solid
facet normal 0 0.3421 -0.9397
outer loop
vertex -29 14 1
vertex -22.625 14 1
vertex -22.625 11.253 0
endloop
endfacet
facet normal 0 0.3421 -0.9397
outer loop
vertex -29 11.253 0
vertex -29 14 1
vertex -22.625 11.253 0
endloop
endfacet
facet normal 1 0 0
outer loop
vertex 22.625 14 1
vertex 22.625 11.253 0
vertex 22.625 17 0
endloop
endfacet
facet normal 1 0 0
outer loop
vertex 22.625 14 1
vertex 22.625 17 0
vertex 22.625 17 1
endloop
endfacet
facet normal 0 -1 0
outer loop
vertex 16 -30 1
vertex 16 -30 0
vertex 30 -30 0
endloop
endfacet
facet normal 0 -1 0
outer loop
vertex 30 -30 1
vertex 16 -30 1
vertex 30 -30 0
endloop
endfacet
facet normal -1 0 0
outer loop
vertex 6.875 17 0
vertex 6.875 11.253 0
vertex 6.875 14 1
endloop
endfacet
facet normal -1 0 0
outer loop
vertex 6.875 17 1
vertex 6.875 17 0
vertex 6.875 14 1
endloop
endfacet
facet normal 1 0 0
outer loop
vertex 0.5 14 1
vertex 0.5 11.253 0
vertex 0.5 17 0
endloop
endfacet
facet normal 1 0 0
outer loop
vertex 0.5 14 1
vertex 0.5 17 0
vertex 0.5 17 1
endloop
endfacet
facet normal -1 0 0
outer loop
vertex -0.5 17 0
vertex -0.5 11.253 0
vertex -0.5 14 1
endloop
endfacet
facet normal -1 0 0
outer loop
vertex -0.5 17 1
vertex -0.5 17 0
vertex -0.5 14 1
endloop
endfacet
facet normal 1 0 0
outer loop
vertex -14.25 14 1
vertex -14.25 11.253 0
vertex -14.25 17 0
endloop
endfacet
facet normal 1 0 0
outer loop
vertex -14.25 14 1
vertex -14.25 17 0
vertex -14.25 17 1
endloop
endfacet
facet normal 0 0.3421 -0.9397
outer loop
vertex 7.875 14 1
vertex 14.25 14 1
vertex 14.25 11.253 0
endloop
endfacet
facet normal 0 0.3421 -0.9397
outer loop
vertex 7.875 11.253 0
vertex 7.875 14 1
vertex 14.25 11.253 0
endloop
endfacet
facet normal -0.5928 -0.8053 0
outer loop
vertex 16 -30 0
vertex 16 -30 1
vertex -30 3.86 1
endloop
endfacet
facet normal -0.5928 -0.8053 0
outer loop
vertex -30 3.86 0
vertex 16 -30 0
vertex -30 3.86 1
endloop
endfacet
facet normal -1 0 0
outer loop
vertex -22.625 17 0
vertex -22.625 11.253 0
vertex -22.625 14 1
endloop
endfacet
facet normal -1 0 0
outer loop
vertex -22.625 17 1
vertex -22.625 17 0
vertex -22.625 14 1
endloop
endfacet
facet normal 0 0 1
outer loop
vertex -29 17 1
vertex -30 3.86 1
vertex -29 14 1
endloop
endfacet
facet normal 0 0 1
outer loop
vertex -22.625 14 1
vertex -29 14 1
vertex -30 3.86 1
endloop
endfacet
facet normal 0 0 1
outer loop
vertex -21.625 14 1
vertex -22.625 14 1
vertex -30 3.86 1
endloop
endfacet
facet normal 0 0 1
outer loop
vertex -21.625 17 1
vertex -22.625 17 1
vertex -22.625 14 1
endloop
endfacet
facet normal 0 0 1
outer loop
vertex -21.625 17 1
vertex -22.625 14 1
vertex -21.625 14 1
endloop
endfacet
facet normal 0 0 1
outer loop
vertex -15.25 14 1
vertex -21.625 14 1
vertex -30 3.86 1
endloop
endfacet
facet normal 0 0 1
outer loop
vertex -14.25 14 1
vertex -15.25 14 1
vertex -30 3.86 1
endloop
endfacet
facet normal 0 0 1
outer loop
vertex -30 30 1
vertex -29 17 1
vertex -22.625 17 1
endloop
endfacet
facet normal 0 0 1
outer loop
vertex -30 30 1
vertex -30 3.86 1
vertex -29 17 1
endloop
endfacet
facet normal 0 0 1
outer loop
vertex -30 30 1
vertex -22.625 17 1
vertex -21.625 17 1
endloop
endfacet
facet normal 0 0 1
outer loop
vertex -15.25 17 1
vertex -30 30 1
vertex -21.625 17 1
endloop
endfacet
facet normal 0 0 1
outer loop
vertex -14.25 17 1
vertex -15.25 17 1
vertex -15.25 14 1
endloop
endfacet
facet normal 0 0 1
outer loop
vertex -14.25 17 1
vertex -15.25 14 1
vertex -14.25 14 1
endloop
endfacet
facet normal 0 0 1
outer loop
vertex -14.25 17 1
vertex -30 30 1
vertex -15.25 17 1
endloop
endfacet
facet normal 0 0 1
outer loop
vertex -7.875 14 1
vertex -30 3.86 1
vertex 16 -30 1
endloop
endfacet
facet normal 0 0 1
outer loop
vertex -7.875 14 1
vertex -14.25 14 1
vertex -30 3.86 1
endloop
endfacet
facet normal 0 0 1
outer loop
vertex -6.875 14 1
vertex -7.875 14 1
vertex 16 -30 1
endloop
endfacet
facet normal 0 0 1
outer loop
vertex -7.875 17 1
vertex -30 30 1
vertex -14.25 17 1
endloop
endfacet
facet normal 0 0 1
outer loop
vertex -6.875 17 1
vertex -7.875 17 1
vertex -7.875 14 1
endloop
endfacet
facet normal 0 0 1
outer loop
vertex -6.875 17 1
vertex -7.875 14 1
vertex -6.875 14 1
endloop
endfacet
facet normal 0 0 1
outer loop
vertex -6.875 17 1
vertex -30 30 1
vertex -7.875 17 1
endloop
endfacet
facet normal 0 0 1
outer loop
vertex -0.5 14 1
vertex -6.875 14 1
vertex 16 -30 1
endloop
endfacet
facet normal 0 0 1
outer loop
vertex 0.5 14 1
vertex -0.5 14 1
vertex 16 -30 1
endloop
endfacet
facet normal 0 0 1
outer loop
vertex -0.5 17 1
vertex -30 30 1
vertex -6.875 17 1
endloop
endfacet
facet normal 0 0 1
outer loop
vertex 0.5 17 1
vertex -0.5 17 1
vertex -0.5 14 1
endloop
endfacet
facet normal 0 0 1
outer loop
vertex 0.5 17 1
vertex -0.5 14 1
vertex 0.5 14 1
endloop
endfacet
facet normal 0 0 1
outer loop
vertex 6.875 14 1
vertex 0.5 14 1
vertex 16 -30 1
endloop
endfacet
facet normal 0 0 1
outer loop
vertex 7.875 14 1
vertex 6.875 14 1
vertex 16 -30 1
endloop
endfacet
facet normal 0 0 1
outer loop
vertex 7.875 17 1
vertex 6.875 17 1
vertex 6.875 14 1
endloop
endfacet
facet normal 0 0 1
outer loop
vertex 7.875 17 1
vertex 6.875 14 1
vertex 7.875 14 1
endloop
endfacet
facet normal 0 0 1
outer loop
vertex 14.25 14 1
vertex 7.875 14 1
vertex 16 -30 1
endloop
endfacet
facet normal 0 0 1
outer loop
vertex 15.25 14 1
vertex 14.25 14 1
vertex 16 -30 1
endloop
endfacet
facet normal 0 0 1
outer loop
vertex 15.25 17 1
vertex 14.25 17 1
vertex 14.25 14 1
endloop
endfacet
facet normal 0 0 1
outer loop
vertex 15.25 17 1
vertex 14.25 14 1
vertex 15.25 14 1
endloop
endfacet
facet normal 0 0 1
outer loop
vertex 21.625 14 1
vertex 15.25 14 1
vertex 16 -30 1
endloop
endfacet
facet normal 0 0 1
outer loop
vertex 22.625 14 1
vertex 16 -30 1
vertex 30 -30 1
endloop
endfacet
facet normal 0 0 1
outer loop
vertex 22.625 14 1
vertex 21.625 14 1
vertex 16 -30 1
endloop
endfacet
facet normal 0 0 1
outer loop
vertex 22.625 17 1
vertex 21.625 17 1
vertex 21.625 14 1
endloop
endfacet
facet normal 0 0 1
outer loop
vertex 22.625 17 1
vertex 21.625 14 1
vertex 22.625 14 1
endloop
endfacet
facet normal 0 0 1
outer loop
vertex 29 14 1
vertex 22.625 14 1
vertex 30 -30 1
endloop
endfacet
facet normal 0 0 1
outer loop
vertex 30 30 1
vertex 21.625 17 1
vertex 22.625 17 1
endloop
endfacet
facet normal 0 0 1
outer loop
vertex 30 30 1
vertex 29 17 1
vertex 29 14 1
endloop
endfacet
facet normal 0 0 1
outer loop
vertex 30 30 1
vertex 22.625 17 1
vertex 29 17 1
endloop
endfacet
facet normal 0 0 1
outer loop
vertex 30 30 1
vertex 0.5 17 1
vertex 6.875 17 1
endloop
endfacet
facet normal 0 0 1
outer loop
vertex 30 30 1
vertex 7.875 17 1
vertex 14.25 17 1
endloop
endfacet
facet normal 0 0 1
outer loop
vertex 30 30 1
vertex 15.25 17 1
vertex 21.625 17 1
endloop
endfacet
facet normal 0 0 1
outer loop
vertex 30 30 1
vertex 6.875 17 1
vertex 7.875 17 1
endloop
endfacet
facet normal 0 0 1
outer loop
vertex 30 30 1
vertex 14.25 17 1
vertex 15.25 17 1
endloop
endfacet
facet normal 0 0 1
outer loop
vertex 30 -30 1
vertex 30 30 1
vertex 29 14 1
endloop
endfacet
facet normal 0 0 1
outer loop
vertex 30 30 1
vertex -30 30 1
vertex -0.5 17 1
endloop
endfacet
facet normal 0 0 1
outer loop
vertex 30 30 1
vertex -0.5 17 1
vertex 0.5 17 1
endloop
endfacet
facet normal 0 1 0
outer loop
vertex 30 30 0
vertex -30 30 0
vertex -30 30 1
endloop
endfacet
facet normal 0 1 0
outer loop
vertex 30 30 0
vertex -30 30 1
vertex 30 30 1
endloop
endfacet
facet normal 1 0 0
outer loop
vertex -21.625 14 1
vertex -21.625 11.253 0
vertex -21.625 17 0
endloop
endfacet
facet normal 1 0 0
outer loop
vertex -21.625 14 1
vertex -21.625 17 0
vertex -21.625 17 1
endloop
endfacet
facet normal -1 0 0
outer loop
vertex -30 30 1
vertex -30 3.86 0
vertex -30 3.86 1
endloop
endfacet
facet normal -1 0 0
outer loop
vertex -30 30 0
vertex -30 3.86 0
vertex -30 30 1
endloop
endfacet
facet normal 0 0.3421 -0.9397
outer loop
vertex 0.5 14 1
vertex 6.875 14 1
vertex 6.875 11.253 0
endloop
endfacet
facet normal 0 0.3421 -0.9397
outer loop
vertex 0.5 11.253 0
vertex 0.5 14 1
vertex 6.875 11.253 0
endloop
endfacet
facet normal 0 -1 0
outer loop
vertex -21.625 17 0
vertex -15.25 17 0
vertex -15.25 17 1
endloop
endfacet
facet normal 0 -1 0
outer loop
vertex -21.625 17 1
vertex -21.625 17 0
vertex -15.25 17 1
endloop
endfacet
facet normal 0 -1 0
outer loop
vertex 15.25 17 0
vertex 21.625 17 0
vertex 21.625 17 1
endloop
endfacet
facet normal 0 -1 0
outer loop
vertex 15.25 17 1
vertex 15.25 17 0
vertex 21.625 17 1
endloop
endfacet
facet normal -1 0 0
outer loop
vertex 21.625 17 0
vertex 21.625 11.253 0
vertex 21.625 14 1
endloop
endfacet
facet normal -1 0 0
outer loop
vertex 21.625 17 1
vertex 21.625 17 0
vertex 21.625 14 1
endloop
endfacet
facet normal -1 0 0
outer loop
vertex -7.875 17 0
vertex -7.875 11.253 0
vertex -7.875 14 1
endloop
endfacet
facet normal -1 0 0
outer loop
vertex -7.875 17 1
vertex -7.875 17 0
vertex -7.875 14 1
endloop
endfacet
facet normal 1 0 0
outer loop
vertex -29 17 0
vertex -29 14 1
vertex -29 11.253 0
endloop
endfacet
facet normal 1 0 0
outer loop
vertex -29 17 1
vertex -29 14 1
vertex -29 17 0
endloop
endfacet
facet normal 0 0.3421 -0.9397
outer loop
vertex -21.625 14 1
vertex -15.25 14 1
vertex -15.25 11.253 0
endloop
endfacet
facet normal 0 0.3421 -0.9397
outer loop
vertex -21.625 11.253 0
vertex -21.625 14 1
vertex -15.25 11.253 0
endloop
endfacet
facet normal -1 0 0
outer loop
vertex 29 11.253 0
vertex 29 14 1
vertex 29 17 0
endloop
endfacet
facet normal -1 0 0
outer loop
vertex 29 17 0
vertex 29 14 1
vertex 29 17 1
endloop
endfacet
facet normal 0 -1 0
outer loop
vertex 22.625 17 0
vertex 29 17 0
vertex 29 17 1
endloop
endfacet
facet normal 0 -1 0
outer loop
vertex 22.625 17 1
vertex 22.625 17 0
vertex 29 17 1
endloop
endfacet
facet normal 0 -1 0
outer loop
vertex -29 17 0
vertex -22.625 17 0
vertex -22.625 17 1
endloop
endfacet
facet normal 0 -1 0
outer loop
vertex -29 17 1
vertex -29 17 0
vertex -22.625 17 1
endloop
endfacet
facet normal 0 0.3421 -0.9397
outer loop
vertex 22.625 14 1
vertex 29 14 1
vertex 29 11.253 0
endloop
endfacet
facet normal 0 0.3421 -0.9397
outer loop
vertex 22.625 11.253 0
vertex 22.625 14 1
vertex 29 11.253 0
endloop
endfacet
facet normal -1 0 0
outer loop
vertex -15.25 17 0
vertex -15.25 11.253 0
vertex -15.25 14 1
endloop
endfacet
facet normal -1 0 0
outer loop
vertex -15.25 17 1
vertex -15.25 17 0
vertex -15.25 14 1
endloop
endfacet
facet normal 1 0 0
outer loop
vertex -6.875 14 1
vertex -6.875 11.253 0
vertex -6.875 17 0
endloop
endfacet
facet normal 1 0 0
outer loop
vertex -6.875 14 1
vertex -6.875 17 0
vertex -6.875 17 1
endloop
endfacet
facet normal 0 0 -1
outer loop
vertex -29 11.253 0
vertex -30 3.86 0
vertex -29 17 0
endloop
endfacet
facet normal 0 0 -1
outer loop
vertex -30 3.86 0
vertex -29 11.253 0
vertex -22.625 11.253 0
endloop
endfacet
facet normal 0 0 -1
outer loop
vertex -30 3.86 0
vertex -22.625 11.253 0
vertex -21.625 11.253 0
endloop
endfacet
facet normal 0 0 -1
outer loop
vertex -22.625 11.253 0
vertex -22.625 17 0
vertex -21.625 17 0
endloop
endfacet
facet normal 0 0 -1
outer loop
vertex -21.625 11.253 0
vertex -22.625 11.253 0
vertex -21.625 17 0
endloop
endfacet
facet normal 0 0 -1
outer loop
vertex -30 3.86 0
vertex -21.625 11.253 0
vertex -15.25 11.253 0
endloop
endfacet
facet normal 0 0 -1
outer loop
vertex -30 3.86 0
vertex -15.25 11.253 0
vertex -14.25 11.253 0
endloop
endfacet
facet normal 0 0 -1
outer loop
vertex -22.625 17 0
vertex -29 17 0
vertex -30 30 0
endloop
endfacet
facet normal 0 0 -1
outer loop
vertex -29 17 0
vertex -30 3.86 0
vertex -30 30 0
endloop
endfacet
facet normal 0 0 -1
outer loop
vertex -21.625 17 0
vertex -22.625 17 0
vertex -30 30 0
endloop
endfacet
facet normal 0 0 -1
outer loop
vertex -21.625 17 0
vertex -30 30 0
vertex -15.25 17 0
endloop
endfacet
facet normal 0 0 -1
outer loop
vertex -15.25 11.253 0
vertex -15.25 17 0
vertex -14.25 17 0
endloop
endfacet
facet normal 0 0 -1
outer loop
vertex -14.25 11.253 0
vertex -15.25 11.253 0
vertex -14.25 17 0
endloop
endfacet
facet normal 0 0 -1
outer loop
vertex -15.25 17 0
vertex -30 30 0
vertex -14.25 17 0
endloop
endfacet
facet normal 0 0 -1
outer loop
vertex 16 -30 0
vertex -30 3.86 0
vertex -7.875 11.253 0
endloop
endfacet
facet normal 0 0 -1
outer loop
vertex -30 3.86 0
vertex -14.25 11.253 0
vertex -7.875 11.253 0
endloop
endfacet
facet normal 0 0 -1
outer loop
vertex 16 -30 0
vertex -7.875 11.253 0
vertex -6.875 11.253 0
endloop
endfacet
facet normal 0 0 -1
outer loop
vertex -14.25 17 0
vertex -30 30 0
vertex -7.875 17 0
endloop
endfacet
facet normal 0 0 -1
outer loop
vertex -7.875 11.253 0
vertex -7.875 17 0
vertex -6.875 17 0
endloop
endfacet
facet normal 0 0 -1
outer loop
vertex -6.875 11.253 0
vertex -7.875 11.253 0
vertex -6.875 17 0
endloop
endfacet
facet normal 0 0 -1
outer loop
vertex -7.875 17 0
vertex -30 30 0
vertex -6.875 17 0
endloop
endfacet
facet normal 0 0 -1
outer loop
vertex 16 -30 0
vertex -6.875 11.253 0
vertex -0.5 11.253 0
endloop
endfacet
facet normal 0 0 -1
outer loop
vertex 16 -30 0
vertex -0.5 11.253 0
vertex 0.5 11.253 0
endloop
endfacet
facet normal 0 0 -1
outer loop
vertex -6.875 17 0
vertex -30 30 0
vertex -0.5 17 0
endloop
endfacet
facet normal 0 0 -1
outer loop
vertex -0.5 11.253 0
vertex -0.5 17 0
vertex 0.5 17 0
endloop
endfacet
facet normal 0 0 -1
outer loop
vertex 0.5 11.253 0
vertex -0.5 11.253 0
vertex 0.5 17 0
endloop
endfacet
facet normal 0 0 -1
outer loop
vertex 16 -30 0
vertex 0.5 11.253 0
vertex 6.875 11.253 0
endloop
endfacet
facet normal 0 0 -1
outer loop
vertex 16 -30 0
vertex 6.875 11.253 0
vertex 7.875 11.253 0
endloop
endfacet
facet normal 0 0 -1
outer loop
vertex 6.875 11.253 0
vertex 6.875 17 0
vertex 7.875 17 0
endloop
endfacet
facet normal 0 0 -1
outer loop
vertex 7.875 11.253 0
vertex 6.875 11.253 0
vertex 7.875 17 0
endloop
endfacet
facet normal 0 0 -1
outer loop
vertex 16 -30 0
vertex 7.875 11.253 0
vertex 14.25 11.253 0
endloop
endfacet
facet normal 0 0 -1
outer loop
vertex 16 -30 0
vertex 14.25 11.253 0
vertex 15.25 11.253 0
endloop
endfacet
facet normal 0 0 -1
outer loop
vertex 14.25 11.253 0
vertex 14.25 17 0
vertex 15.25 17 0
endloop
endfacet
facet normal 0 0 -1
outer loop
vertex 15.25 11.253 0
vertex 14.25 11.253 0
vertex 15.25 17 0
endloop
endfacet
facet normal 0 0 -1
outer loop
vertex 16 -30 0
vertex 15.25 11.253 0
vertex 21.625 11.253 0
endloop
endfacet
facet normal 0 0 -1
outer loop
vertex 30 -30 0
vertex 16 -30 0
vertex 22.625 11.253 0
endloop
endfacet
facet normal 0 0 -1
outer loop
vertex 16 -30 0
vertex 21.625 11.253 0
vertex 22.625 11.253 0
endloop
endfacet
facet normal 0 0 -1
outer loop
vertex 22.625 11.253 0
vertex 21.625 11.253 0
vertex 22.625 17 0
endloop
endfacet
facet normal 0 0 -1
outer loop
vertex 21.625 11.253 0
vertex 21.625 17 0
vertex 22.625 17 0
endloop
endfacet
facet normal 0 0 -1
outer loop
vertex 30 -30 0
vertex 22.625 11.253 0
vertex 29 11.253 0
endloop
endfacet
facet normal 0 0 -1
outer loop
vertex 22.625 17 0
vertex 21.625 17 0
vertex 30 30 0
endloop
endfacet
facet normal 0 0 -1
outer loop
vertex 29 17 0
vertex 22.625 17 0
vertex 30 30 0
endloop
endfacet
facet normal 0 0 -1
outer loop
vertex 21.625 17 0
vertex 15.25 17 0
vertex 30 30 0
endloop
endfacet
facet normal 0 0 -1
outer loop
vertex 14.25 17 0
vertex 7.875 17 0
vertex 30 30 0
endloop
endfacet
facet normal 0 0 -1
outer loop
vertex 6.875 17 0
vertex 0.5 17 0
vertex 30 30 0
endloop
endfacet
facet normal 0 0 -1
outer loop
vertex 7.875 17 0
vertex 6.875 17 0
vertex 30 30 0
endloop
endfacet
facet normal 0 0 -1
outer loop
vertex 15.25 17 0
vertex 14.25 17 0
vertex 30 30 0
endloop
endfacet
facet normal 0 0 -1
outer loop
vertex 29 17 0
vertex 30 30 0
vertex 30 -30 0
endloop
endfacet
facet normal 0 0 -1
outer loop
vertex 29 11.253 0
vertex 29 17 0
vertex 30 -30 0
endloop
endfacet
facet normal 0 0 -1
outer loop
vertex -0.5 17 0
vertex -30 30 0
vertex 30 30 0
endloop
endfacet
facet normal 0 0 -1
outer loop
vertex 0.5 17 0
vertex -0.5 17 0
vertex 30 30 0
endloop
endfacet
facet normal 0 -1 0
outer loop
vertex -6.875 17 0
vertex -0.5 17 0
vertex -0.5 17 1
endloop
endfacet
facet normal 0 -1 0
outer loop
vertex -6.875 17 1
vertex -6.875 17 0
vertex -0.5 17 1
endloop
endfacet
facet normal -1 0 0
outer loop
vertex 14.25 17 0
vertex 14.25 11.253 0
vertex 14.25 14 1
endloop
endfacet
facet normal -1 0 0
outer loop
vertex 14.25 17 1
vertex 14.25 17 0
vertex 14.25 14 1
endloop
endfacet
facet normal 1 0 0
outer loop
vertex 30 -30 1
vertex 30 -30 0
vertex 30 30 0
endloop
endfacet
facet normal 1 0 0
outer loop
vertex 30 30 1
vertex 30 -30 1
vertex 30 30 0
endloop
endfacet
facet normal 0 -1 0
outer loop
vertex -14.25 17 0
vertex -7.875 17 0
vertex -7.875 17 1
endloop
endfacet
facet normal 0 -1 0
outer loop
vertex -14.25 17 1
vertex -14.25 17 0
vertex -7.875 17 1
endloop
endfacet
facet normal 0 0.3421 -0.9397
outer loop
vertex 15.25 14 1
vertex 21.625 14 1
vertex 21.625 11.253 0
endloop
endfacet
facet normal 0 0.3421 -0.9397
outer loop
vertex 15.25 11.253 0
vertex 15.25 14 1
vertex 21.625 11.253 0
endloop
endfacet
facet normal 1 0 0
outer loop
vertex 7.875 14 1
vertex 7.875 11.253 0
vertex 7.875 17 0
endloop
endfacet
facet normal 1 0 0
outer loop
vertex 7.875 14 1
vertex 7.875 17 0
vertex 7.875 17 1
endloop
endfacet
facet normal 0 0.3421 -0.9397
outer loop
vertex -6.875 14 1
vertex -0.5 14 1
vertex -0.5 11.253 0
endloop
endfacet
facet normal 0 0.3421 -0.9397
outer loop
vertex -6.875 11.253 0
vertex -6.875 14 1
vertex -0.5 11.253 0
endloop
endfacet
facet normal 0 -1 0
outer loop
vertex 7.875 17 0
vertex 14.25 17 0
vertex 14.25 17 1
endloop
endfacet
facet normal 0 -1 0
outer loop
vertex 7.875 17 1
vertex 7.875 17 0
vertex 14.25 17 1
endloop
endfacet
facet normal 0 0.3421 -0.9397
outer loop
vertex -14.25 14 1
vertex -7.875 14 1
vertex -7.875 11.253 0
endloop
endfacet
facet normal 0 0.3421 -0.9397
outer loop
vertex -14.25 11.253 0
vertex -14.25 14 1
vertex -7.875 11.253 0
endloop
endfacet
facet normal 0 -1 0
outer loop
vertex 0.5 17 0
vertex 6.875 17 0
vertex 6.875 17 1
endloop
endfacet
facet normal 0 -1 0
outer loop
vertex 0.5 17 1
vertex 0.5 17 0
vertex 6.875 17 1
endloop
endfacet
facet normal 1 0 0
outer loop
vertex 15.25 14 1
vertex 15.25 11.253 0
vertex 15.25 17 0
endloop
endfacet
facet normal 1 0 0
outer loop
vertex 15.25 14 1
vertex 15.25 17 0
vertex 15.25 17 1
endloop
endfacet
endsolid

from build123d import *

# Parameters (mm, degrees)
F0_W     = 60
F0_H     = 60
F1_DEPTH = 1
F4_DEPTH = 1
F5_DEPTH = 29
F6_W     = 1
F6_H     = 1


with BuildPart() as f1:
    # F0 (on Top) → F1 (new body)
    with BuildSketch(Plane.XY):
        Rectangle(F0_W, F0_H)
    extrude(amount=F1_DEPTH)

    # F3 (on face) → F4 (cut, through all)
    with BuildSketch(Plane.XY.offset(1)):
        Polygon((-30, -30), (16, -30), (-30, 3.8595641273), align=None)
    extrude(amount=-F4_DEPTH, mode=Mode.SUBTRACT)

    # F2 (on Right) → F5 (cut, symmetric)
    with BuildSketch(Plane.YZ):
        Polygon((11.2525225805, 0), (17, 0), (17, 1), (14, 1), align=None)
    extrude(amount=F5_DEPTH, both=True, mode=Mode.SUBTRACT)

    # F6 (on face) → F7 (join, up to the next surface of F1)
    with BuildSketch(Plane.XZ.offset(-17)):
        with Locations((-22.125, 0.5)):
            Rectangle(F6_W, F6_H)
        with Locations((-14.75, 0.5)):
            Rectangle(F6_W, F6_H)
        with Locations((-7.375, 0.5)):
            Rectangle(F6_W, F6_H)
        with Locations((0, 0.5)):
            Rectangle(F6_W, F6_H)
        with Locations((7.375, 0.5)):
            Rectangle(F6_W, F6_H)
        with Locations((14.75, 0.5)):
            Rectangle(F6_W, F6_H)
        with Locations((22.125, 0.5)):
            Rectangle(F6_W, F6_H)
    extrude(until=Until.NEXT)


solid = f1.part
